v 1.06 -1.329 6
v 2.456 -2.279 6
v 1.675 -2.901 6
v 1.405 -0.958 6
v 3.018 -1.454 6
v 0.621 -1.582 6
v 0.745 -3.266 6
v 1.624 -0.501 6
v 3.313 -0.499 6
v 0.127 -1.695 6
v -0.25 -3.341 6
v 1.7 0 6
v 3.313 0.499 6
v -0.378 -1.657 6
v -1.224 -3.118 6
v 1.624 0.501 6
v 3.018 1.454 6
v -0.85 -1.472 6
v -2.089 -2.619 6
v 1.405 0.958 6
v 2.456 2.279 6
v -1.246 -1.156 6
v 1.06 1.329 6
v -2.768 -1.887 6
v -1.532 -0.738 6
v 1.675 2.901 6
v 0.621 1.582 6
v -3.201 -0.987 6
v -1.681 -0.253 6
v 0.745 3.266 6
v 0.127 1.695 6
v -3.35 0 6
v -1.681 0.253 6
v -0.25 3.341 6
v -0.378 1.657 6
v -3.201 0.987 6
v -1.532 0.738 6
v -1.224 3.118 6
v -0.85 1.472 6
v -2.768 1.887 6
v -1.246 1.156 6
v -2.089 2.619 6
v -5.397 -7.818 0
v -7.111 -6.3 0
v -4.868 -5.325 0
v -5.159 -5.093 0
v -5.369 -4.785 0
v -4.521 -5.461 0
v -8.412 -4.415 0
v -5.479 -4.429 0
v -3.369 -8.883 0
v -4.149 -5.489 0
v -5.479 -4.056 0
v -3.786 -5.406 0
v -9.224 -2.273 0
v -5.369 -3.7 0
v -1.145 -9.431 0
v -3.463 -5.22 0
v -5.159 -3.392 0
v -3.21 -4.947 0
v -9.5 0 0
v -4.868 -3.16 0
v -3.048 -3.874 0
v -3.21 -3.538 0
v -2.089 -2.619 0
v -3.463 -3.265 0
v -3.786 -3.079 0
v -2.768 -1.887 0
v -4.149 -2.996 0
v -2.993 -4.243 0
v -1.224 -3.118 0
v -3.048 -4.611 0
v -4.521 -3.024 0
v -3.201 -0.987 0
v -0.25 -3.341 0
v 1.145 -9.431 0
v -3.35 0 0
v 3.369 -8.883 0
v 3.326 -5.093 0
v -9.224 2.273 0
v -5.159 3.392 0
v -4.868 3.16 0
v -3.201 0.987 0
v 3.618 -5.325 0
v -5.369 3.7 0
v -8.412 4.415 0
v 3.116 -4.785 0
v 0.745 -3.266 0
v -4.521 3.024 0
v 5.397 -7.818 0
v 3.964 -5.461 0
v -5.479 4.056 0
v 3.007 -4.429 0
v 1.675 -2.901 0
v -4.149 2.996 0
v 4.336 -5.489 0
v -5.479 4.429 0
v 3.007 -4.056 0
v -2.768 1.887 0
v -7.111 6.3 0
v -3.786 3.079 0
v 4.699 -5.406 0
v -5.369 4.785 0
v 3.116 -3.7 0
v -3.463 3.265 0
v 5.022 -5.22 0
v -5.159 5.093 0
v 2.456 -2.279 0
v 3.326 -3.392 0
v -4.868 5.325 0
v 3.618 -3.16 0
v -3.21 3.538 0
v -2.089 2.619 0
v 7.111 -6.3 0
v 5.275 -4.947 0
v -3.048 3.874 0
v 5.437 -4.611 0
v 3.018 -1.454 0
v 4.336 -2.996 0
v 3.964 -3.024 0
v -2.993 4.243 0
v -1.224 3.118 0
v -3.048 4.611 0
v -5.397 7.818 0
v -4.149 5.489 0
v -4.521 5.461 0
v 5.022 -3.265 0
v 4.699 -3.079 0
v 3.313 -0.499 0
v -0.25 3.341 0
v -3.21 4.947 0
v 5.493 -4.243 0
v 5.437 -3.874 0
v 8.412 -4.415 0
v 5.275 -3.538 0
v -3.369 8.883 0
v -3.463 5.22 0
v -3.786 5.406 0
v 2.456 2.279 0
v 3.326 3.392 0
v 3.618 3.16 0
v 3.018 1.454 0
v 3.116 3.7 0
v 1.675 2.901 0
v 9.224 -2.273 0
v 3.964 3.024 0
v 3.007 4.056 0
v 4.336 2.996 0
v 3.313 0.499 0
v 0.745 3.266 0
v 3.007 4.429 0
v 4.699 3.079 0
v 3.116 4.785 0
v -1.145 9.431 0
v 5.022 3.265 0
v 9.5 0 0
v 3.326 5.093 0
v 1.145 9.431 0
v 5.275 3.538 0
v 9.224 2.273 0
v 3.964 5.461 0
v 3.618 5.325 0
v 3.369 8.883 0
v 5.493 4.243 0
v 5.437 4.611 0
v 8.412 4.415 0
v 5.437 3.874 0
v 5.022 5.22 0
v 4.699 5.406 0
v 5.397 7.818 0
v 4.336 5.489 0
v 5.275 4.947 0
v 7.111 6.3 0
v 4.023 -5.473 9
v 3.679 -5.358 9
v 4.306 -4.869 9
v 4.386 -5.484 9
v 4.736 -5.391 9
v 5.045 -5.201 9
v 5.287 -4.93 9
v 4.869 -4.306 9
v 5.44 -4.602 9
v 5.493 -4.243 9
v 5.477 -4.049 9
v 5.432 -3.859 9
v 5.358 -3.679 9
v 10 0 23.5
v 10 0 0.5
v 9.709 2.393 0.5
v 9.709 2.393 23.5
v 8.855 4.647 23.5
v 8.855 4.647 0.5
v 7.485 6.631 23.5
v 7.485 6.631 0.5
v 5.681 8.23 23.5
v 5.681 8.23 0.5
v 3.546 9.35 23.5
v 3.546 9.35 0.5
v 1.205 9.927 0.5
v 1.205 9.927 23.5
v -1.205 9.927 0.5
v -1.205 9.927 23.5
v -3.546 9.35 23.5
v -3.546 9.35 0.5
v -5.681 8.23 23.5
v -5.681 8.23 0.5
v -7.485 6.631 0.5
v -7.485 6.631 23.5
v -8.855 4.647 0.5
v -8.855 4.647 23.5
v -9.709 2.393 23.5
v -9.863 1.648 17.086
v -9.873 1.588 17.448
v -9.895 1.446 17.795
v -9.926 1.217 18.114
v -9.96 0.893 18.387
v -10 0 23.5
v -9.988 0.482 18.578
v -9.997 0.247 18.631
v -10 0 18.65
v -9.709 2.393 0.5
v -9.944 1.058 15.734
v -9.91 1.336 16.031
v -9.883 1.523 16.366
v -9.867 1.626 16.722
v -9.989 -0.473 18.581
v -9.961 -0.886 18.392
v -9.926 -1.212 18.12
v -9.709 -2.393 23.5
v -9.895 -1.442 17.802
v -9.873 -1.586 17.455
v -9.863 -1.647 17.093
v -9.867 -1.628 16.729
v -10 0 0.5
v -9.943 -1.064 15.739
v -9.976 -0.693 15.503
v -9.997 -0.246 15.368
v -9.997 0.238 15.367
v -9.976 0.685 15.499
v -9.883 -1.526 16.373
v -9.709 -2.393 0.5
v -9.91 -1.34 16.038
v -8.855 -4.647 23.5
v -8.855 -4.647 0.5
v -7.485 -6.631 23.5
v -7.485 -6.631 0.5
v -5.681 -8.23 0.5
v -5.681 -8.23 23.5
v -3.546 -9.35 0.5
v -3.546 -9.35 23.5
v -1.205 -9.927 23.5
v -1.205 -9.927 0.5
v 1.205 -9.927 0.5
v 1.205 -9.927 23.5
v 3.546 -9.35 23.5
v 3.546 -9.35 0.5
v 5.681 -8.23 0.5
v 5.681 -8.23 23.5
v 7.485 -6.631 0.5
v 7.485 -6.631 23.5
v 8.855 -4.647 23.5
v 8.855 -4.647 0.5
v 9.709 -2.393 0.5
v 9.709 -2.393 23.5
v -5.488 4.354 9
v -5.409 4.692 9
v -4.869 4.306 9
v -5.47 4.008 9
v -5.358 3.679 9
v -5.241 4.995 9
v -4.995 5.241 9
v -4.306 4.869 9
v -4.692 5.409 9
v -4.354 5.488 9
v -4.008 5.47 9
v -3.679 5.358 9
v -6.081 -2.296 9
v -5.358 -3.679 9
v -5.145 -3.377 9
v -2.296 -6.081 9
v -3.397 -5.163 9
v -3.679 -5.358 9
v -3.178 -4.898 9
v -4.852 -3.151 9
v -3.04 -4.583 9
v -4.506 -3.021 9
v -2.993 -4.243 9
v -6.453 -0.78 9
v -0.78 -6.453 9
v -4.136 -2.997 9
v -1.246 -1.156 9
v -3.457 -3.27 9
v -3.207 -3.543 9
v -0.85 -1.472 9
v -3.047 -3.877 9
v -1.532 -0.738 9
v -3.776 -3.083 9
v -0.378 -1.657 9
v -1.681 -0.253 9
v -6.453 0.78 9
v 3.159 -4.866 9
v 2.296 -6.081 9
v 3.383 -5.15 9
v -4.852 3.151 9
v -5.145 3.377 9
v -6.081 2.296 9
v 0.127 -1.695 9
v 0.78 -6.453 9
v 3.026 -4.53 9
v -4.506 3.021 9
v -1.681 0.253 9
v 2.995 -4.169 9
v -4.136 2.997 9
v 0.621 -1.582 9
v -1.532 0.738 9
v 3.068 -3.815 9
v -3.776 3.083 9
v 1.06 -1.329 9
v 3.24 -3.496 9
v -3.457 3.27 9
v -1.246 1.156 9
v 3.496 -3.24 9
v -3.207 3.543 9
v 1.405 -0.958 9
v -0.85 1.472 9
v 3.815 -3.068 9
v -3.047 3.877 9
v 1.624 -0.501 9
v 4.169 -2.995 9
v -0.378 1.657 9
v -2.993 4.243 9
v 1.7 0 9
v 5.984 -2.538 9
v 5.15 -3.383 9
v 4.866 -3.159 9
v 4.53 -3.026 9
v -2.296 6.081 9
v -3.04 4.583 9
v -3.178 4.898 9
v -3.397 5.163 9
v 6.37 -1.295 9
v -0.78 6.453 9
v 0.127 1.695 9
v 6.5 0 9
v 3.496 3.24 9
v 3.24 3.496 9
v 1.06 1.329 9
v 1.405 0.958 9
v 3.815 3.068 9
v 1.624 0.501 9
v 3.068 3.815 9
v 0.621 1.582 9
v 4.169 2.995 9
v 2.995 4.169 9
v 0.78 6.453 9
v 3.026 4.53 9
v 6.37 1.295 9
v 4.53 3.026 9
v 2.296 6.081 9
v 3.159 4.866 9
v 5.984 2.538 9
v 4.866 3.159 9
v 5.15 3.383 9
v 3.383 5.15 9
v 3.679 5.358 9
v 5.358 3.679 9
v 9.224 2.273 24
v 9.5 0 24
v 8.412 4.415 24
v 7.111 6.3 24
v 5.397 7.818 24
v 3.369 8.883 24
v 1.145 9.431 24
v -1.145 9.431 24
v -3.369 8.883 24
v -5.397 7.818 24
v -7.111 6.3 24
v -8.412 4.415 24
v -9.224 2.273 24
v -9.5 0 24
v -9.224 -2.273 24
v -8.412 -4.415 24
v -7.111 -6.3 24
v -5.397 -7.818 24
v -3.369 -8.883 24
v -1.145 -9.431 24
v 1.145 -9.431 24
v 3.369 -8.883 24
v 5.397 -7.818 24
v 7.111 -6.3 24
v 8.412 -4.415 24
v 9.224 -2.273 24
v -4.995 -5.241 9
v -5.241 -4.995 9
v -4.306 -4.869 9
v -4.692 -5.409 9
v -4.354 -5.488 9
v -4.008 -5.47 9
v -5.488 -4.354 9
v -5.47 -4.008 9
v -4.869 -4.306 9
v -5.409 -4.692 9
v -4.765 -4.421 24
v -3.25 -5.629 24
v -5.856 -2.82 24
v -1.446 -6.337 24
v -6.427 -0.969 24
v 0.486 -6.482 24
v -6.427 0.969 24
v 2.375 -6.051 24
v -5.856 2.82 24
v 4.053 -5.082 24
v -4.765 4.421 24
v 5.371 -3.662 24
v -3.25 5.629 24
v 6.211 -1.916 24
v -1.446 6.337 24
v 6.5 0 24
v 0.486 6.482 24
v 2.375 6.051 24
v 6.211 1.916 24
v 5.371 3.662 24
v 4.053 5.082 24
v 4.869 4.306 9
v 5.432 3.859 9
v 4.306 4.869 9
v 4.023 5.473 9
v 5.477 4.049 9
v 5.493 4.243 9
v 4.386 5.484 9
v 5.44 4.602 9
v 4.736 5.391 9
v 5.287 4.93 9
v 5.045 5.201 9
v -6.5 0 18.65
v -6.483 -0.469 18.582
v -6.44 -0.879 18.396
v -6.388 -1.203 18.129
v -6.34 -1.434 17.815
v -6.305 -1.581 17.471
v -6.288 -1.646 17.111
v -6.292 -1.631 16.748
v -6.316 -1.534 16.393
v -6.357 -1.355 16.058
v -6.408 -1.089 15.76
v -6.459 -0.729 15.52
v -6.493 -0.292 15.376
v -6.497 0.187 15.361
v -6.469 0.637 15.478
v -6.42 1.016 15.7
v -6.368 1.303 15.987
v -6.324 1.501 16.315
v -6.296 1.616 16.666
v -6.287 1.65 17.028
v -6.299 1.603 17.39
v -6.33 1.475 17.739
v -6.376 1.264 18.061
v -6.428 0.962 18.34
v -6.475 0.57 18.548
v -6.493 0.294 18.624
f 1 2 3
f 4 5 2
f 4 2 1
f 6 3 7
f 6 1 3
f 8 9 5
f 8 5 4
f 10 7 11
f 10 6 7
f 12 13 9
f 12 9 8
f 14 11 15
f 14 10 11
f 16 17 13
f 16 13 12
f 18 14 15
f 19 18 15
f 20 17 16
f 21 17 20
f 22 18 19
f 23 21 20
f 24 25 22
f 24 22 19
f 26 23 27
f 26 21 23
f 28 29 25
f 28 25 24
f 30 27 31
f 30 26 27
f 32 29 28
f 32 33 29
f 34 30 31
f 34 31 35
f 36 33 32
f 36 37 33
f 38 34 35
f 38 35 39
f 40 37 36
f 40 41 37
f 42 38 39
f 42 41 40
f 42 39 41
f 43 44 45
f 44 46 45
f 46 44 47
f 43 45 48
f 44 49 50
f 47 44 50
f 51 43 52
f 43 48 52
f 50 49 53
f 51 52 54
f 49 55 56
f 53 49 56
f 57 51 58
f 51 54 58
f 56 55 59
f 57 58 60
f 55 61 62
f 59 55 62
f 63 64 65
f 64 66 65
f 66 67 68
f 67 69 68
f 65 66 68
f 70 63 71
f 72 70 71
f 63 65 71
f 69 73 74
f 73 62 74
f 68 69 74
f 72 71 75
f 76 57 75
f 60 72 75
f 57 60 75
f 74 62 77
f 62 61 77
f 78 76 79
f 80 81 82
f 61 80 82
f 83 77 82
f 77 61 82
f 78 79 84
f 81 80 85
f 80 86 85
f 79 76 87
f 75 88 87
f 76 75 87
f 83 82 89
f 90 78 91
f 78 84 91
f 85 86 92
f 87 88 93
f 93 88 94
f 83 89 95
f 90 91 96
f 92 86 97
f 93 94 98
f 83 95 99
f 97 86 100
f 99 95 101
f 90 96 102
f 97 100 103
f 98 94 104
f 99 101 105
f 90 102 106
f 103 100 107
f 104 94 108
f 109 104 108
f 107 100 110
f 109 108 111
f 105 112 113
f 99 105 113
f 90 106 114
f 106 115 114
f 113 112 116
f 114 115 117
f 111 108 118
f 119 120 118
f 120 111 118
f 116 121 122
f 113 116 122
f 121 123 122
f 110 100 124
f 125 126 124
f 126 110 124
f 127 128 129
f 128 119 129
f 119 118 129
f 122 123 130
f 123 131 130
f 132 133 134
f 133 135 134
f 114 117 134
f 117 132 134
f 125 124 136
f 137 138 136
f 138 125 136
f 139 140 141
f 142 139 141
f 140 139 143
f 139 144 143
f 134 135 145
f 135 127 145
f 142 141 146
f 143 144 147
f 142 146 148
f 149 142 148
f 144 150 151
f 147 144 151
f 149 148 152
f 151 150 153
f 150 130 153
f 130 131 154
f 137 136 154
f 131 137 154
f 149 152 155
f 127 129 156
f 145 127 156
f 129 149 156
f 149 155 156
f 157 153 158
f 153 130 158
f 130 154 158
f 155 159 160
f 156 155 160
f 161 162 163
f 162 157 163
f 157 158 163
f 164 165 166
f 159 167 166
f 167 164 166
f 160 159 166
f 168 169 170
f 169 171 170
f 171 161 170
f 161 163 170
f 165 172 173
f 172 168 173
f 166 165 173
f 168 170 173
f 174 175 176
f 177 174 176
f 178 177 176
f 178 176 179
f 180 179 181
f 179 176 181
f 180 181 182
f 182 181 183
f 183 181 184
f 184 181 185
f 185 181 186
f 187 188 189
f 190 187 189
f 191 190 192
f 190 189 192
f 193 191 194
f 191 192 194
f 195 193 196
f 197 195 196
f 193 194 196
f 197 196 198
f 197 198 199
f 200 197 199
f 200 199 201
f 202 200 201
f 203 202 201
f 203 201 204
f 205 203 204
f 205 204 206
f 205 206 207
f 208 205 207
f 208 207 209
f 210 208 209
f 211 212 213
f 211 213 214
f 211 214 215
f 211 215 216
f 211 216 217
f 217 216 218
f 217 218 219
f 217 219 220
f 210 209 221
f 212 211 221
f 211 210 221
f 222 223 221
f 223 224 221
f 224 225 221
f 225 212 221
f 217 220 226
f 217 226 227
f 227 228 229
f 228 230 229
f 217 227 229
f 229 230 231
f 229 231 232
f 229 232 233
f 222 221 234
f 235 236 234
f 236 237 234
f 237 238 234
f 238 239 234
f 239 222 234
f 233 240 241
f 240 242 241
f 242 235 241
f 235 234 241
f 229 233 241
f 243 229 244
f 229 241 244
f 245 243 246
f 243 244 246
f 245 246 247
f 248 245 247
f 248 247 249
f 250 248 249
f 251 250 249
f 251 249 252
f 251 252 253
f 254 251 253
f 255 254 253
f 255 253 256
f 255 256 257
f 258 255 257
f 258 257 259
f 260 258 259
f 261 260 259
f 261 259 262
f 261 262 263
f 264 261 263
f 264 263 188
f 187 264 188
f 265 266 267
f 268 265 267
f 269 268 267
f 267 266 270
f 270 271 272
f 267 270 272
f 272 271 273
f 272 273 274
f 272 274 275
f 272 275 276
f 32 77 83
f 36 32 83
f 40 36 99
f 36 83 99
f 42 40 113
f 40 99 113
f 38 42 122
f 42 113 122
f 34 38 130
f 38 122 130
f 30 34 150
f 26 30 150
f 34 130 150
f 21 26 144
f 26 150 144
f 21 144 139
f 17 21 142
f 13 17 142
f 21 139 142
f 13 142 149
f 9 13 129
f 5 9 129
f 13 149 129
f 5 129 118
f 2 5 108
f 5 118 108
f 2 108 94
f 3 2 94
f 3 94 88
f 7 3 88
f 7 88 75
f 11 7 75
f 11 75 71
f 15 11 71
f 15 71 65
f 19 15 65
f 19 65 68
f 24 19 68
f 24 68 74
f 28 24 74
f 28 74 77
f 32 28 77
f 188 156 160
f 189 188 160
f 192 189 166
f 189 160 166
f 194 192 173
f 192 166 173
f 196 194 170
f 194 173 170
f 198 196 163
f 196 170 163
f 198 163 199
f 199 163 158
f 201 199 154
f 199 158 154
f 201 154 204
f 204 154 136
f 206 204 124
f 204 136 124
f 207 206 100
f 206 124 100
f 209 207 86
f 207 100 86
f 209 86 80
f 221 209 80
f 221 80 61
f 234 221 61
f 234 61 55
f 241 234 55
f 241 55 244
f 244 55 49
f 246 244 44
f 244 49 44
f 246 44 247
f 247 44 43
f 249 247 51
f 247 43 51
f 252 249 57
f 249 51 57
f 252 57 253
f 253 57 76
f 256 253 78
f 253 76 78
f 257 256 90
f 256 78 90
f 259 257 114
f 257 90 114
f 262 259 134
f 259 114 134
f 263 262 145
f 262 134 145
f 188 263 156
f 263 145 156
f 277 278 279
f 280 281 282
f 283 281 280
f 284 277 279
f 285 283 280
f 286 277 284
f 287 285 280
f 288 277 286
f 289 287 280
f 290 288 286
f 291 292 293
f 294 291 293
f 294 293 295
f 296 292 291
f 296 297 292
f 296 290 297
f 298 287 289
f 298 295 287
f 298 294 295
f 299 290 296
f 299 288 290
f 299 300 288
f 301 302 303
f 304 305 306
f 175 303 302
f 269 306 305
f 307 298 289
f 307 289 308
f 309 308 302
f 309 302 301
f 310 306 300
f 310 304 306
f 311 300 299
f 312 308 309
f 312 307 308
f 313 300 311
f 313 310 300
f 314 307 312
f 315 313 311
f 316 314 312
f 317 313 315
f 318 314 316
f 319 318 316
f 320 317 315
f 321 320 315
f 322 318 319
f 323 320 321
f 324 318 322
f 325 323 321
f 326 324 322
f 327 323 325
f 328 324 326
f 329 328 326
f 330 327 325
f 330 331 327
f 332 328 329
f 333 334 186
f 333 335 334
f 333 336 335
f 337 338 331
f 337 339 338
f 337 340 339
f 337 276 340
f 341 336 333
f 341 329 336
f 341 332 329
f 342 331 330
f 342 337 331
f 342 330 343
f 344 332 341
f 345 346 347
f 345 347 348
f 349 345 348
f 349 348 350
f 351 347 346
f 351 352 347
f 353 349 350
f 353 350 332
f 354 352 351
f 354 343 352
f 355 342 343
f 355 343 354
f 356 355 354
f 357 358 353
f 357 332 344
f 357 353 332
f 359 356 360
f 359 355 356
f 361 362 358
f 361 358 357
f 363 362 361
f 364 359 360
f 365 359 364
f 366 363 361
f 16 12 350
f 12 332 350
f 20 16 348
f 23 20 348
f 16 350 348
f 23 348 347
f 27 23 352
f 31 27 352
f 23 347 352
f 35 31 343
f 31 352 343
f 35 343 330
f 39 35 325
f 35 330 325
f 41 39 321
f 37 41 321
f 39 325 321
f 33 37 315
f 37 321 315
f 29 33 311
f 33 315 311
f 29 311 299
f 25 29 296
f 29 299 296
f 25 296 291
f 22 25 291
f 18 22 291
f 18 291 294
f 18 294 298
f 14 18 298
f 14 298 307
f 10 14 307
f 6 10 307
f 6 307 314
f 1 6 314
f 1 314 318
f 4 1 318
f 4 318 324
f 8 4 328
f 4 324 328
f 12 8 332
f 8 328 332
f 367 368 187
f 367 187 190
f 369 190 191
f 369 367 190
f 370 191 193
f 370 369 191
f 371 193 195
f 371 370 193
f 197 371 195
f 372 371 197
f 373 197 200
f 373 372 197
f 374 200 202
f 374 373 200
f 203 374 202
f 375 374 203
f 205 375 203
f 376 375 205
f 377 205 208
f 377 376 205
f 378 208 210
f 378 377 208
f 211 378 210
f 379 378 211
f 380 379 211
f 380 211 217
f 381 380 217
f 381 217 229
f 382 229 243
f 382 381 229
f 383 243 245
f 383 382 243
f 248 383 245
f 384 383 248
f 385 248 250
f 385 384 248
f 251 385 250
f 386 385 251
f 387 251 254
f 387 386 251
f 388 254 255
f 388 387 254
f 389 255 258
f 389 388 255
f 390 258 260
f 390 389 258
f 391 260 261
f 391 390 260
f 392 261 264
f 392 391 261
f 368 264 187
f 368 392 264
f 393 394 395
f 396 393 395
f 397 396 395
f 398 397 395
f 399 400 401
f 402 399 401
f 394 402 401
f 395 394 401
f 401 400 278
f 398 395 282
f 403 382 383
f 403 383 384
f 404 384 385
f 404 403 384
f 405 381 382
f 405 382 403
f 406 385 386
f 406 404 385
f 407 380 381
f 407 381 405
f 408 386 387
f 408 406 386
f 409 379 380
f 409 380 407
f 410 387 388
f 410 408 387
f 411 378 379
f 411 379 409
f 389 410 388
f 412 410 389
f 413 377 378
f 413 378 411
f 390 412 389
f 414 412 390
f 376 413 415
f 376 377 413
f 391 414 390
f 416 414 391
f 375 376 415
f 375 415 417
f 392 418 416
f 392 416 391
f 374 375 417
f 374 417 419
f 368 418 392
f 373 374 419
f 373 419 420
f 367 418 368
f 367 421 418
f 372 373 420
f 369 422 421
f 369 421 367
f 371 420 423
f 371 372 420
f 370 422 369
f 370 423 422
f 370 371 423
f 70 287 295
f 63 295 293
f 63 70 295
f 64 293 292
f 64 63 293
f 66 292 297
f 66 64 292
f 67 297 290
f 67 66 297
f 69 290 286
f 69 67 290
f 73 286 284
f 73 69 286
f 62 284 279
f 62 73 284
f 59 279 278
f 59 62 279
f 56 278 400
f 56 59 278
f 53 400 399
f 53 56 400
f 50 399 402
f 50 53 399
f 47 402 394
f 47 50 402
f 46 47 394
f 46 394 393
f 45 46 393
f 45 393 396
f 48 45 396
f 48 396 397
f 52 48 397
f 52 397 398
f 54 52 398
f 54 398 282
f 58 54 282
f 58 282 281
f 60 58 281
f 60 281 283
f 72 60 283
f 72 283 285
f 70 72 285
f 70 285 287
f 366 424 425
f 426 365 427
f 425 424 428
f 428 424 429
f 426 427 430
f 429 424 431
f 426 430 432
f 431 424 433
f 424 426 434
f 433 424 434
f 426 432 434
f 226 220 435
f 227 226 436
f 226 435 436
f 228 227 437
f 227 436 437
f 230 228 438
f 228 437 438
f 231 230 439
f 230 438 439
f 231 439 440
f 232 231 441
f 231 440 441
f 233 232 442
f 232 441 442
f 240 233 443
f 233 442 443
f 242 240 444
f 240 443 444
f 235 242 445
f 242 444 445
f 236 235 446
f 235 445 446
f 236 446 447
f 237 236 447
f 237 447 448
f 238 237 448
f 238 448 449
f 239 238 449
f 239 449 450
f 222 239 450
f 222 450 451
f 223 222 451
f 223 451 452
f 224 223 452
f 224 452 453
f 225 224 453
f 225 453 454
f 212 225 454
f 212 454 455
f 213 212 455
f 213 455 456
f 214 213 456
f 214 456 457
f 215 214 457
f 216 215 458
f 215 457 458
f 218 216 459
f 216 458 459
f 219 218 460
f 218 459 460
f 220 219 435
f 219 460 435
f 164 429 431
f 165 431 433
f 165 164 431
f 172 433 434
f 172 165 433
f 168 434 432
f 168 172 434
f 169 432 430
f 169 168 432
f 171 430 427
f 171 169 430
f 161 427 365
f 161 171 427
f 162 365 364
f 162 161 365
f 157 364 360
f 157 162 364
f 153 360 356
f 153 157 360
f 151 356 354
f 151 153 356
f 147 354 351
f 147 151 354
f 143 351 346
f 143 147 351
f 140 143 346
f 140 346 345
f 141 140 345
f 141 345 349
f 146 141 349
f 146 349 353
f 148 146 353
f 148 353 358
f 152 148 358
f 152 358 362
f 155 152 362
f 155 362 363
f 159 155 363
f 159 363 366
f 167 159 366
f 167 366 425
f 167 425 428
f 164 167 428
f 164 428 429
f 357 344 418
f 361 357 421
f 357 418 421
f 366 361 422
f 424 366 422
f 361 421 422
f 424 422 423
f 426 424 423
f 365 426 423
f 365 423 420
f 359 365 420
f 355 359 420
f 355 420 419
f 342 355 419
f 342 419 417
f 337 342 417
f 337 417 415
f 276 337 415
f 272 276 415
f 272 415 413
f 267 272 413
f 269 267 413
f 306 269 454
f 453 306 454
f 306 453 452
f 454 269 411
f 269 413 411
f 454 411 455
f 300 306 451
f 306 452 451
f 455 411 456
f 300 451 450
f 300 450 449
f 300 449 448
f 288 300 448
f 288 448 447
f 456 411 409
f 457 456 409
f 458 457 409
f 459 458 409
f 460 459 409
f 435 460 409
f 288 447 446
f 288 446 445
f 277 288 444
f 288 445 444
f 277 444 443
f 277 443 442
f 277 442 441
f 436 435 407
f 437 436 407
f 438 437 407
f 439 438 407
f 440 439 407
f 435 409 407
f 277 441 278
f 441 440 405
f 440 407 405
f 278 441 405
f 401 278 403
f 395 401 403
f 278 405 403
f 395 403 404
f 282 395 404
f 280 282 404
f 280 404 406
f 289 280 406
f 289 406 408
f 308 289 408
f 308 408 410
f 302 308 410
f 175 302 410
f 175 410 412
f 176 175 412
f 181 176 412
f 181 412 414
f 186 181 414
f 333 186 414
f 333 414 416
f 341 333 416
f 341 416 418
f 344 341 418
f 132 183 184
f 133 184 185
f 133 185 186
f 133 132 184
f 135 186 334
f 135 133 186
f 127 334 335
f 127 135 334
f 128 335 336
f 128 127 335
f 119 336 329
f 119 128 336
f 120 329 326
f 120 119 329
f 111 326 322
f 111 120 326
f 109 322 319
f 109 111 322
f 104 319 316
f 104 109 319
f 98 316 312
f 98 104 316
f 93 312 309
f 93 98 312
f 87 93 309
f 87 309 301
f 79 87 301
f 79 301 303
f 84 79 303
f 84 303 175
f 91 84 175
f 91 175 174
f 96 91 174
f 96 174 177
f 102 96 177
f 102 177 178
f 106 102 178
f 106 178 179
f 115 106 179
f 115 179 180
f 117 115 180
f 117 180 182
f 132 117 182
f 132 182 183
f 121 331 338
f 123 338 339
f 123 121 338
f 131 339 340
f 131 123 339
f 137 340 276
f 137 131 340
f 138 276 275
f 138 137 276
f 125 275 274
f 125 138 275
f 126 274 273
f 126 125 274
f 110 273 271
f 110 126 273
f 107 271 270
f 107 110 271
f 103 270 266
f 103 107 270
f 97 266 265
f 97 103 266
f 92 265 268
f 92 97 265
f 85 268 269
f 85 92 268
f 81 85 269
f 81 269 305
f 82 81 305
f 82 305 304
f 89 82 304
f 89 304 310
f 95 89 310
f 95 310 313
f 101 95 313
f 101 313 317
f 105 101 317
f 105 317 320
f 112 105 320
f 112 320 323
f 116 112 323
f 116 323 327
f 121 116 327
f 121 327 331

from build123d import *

# Parameters (mm, degrees)
SKETCH_1_R                  = 10
EXTRUDE_1_DEPTH             = 24
SKETCH_2_R                  = 6.5
CUT_EXTRUDE_1_DEPTH         = 15
M4X0_71_D                   = 3.3
M4X0_71_DEPTH               = 5
M4X0_71_TIP                 = 0.991420021
M3X0_51_OUTLINE_R           = 1.25
M3X0_51_DEPTH               = 9
HOLE_WIZARD_M31_D           = 3.4
HOLE_WIZARD_M31_CBORE_D     = 6.7
HOLE_WIZARD_M31_CBORE_DEPTH = 6
CHAMFER_1_SIZE              = 0.5


# Read off the part's stored shape, not the designer's step: Отверстие обработанное метчиком M3x0.51
with BuildPart() as part:
    # Эскиз1 → Бобышка-Вытянуть1 (new body)
    with BuildSketch(Plane.XY):
        Circle(SKETCH_1_R)
    extrude(amount=EXTRUDE_1_DEPTH)

    # Эскиз2 → Вырез-Вытянуть1 (cut)
    with BuildSketch(Plane.XY.offset(24)):
        Circle(SKETCH_2_R)
    extrude(amount=-CUT_EXTRUDE_1_DEPTH, mode=Mode.SUBTRACT)

    # Отверстие обработанное метчиком M4x0.71
    with Locations(Plane(origin=(-10, 0, 0), x_dir=(0, 0, -1), z_dir=(-1, 0, 0))):
        with Locations((-17, 0)):
            Hole(M4X0_71_D / 2, depth=M4X0_71_DEPTH)
            with Locations((0, 0, -(M4X0_71_DEPTH + M4X0_71_TIP / 2))):  # 118° drill point
                Cone(0, M4X0_71_D / 2, M4X0_71_TIP, mode=Mode.SUBTRACT)

    # Отверстие обработанное метчиком M3x0.51 outline → Отверстие обработанное метчиком M3x0.51 (cut)
    with BuildSketch(Plane.XY):
        with Locations((4.242640687, -4.242640687)):
            Circle(M3X0_51_OUTLINE_R)
        with Locations((-4.242640687, -4.242640687)):
            Circle(M3X0_51_OUTLINE_R)
        with Locations((-4.242640687, 4.242640687)):
            Circle(M3X0_51_OUTLINE_R)
        with Locations((4.242640687, 4.242640687)):
            Circle(M3X0_51_OUTLINE_R)
    extrude(amount=M3X0_51_DEPTH, mode=Mode.SUBTRACT)

    # Цековка для  винта с полукруглой головкой M31 (through all)
    with Locations(Plane(origin=(0, 0, 0), x_dir=(-1, 0, 0), z_dir=(0, 0, -1))):
        with Locations((0, 0)):
            CounterBoreHole(HOLE_WIZARD_M31_D / 2, HOLE_WIZARD_M31_CBORE_D / 2, HOLE_WIZARD_M31_CBORE_DEPTH)

    # Фаска1
    chamfer_1_edges = [part.edges().sort_by_distance(p)[0] for p in [
        (-10, 0, 0),
        (-10, 0, 24),
    ]]
    chamfer(chamfer_1_edges, length=CHAMFER_1_SIZE)


solid = part.part
